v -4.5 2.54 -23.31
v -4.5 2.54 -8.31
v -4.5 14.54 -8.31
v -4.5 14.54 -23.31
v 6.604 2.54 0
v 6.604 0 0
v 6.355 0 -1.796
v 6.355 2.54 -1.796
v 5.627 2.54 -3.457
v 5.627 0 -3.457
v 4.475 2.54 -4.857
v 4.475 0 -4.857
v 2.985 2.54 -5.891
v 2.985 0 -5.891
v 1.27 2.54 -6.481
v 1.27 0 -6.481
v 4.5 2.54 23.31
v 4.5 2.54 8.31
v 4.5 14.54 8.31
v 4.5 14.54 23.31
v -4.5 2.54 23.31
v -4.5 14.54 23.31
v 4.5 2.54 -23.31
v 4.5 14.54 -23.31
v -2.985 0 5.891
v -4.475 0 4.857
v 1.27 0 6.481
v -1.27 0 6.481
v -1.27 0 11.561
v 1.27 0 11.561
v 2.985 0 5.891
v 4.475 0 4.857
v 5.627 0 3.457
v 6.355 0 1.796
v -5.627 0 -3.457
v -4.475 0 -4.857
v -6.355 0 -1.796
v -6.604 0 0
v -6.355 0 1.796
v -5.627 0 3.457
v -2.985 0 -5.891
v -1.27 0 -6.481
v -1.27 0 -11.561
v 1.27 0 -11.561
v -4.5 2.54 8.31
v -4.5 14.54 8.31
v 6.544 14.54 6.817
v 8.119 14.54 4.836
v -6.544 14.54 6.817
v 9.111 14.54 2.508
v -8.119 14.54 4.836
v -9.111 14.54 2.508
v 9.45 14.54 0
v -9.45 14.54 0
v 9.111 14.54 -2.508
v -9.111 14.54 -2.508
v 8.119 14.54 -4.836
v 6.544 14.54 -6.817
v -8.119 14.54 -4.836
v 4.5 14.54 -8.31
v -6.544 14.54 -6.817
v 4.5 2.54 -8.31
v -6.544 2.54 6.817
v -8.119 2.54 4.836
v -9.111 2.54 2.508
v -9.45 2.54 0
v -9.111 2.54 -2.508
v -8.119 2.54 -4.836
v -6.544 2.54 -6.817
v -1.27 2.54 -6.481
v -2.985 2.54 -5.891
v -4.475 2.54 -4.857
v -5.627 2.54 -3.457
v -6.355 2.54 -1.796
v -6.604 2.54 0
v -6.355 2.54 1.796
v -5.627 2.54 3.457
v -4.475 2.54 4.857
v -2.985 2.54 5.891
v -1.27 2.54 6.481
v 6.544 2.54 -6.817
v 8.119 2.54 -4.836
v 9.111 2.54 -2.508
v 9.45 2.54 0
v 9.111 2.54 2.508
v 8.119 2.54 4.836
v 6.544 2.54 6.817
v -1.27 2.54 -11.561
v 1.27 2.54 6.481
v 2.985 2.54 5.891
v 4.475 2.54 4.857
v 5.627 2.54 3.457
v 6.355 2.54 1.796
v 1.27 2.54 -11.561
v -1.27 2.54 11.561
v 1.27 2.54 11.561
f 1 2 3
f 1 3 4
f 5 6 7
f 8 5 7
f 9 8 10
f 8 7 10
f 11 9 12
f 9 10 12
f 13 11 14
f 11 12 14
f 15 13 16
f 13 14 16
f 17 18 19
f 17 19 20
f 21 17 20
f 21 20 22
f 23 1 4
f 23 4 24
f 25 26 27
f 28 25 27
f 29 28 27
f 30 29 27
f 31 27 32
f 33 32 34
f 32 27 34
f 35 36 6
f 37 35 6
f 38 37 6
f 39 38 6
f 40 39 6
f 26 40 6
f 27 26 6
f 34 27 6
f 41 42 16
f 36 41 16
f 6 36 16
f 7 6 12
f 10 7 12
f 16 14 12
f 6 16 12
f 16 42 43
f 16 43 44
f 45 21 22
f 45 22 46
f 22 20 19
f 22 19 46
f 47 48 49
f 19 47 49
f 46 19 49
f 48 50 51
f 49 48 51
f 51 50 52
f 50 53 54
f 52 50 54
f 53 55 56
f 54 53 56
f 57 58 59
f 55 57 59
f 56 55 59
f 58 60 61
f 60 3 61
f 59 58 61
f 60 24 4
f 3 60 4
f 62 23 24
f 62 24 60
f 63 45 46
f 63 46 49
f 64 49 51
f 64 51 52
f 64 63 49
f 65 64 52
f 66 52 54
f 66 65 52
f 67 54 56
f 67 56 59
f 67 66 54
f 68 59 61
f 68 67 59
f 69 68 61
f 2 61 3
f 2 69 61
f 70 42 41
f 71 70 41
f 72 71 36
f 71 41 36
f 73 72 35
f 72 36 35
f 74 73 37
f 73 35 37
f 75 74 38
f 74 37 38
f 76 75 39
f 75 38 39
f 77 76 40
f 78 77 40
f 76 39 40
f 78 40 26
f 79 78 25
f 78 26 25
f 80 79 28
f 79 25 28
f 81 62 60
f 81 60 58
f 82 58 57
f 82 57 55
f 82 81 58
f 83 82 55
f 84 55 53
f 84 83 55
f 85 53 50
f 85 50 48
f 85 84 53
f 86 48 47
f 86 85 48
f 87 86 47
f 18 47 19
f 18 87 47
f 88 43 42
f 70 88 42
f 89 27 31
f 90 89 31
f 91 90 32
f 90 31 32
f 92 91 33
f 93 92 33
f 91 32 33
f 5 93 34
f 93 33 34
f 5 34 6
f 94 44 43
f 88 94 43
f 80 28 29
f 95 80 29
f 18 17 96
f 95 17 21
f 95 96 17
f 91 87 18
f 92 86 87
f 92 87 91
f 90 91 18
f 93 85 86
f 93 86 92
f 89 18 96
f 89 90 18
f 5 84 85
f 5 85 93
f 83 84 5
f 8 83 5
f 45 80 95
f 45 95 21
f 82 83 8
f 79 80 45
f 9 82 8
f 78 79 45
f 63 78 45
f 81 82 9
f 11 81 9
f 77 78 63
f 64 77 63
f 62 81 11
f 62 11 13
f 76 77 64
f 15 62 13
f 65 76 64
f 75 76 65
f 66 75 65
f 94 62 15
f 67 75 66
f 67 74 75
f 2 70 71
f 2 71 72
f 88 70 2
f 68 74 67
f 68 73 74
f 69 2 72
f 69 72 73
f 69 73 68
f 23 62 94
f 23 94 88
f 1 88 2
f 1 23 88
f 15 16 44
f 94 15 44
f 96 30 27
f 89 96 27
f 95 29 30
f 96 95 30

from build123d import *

# Parameters (mm, degrees)
BOSS_EXTRUDE1_DEPTH = 2.54
BOSS_EXTRUDE2_DEPTH = 12


with BuildPart() as part:
    # Sketch1 → Boss-Extrude1 (new body)
    with BuildSketch(Plane(origin=(0, 0, 0), x_dir=(1, 0, 0), z_dir=(0, 1, 0))):
        with BuildLine():
            ThreePointArc((1.27, -6.480734218), (0, -6.604), (-1.27, -6.480734218))
            Line((-1.27, -6.480734218), (-1.27, -11.560734218))
            Line((-1.27, -11.560734218), (1.27, -11.560734218))
            Line((1.27, -11.560734218), (1.27, -6.480734218))
        make_face()
        with BuildLine():
            ThreePointArc((1.27, 6.480734218), (0, 6.604), (-1.27, 6.480734218))
            ThreePointArc((-1.27, 6.480734218), (-6.604, 0), (-1.27, -6.480734218))
            ThreePointArc((-1.27, -6.480734218), (0, -6.604), (1.27, -6.480734218))
            ThreePointArc((1.27, -6.480734218), (5.099014415, -4.196768757), (6.604, 0))
            ThreePointArc((6.604, 0), (5.099014415, 4.196768757), (1.27, 6.480734218))
        make_face()
        with BuildLine():
            Line((-1.27, 11.560734218), (-1.27, 6.480734218))
            ThreePointArc((-1.27, 6.480734218), (0, 6.604), (1.27, 6.480734218))
            Line((1.27, 6.480734218), (1.27, 11.560734218))
            Line((1.27, 11.560734218), (-1.27, 11.560734218))
        make_face()
    extrude(amount=BOSS_EXTRUDE1_DEPTH)

    # Sketch2 → Boss-Extrude2 (add)
    with BuildSketch(Plane(origin=(0, 2.54, 0), x_dir=(1, 0, 0), z_dir=(0, 1, 0))):
        with BuildLine():
            Line((-4.5, 8.309783391), (-4.5, 23.309783391))
            Line((-4.5, 23.309783391), (4.5, 23.309783391))
            Line((4.5, 23.309783391), (4.5, 8.309783391))
            ThreePointArc((4.5, 8.309783391), (9.45, 0), (4.5, -8.309783391))
            Line((4.5, -8.309783391), (4.5, -23.309783391))
            Line((4.5, -23.309783391), (-4.5, -23.309783391))
            Line((-4.5, -23.309783391), (-4.5, -8.309783391))
            ThreePointArc((-4.5, -8.309783391), (-9.45, 0), (-4.5, 8.309783391))
        make_face()
    extrude(amount=BOSS_EXTRUDE2_DEPTH)


solid = part.part
